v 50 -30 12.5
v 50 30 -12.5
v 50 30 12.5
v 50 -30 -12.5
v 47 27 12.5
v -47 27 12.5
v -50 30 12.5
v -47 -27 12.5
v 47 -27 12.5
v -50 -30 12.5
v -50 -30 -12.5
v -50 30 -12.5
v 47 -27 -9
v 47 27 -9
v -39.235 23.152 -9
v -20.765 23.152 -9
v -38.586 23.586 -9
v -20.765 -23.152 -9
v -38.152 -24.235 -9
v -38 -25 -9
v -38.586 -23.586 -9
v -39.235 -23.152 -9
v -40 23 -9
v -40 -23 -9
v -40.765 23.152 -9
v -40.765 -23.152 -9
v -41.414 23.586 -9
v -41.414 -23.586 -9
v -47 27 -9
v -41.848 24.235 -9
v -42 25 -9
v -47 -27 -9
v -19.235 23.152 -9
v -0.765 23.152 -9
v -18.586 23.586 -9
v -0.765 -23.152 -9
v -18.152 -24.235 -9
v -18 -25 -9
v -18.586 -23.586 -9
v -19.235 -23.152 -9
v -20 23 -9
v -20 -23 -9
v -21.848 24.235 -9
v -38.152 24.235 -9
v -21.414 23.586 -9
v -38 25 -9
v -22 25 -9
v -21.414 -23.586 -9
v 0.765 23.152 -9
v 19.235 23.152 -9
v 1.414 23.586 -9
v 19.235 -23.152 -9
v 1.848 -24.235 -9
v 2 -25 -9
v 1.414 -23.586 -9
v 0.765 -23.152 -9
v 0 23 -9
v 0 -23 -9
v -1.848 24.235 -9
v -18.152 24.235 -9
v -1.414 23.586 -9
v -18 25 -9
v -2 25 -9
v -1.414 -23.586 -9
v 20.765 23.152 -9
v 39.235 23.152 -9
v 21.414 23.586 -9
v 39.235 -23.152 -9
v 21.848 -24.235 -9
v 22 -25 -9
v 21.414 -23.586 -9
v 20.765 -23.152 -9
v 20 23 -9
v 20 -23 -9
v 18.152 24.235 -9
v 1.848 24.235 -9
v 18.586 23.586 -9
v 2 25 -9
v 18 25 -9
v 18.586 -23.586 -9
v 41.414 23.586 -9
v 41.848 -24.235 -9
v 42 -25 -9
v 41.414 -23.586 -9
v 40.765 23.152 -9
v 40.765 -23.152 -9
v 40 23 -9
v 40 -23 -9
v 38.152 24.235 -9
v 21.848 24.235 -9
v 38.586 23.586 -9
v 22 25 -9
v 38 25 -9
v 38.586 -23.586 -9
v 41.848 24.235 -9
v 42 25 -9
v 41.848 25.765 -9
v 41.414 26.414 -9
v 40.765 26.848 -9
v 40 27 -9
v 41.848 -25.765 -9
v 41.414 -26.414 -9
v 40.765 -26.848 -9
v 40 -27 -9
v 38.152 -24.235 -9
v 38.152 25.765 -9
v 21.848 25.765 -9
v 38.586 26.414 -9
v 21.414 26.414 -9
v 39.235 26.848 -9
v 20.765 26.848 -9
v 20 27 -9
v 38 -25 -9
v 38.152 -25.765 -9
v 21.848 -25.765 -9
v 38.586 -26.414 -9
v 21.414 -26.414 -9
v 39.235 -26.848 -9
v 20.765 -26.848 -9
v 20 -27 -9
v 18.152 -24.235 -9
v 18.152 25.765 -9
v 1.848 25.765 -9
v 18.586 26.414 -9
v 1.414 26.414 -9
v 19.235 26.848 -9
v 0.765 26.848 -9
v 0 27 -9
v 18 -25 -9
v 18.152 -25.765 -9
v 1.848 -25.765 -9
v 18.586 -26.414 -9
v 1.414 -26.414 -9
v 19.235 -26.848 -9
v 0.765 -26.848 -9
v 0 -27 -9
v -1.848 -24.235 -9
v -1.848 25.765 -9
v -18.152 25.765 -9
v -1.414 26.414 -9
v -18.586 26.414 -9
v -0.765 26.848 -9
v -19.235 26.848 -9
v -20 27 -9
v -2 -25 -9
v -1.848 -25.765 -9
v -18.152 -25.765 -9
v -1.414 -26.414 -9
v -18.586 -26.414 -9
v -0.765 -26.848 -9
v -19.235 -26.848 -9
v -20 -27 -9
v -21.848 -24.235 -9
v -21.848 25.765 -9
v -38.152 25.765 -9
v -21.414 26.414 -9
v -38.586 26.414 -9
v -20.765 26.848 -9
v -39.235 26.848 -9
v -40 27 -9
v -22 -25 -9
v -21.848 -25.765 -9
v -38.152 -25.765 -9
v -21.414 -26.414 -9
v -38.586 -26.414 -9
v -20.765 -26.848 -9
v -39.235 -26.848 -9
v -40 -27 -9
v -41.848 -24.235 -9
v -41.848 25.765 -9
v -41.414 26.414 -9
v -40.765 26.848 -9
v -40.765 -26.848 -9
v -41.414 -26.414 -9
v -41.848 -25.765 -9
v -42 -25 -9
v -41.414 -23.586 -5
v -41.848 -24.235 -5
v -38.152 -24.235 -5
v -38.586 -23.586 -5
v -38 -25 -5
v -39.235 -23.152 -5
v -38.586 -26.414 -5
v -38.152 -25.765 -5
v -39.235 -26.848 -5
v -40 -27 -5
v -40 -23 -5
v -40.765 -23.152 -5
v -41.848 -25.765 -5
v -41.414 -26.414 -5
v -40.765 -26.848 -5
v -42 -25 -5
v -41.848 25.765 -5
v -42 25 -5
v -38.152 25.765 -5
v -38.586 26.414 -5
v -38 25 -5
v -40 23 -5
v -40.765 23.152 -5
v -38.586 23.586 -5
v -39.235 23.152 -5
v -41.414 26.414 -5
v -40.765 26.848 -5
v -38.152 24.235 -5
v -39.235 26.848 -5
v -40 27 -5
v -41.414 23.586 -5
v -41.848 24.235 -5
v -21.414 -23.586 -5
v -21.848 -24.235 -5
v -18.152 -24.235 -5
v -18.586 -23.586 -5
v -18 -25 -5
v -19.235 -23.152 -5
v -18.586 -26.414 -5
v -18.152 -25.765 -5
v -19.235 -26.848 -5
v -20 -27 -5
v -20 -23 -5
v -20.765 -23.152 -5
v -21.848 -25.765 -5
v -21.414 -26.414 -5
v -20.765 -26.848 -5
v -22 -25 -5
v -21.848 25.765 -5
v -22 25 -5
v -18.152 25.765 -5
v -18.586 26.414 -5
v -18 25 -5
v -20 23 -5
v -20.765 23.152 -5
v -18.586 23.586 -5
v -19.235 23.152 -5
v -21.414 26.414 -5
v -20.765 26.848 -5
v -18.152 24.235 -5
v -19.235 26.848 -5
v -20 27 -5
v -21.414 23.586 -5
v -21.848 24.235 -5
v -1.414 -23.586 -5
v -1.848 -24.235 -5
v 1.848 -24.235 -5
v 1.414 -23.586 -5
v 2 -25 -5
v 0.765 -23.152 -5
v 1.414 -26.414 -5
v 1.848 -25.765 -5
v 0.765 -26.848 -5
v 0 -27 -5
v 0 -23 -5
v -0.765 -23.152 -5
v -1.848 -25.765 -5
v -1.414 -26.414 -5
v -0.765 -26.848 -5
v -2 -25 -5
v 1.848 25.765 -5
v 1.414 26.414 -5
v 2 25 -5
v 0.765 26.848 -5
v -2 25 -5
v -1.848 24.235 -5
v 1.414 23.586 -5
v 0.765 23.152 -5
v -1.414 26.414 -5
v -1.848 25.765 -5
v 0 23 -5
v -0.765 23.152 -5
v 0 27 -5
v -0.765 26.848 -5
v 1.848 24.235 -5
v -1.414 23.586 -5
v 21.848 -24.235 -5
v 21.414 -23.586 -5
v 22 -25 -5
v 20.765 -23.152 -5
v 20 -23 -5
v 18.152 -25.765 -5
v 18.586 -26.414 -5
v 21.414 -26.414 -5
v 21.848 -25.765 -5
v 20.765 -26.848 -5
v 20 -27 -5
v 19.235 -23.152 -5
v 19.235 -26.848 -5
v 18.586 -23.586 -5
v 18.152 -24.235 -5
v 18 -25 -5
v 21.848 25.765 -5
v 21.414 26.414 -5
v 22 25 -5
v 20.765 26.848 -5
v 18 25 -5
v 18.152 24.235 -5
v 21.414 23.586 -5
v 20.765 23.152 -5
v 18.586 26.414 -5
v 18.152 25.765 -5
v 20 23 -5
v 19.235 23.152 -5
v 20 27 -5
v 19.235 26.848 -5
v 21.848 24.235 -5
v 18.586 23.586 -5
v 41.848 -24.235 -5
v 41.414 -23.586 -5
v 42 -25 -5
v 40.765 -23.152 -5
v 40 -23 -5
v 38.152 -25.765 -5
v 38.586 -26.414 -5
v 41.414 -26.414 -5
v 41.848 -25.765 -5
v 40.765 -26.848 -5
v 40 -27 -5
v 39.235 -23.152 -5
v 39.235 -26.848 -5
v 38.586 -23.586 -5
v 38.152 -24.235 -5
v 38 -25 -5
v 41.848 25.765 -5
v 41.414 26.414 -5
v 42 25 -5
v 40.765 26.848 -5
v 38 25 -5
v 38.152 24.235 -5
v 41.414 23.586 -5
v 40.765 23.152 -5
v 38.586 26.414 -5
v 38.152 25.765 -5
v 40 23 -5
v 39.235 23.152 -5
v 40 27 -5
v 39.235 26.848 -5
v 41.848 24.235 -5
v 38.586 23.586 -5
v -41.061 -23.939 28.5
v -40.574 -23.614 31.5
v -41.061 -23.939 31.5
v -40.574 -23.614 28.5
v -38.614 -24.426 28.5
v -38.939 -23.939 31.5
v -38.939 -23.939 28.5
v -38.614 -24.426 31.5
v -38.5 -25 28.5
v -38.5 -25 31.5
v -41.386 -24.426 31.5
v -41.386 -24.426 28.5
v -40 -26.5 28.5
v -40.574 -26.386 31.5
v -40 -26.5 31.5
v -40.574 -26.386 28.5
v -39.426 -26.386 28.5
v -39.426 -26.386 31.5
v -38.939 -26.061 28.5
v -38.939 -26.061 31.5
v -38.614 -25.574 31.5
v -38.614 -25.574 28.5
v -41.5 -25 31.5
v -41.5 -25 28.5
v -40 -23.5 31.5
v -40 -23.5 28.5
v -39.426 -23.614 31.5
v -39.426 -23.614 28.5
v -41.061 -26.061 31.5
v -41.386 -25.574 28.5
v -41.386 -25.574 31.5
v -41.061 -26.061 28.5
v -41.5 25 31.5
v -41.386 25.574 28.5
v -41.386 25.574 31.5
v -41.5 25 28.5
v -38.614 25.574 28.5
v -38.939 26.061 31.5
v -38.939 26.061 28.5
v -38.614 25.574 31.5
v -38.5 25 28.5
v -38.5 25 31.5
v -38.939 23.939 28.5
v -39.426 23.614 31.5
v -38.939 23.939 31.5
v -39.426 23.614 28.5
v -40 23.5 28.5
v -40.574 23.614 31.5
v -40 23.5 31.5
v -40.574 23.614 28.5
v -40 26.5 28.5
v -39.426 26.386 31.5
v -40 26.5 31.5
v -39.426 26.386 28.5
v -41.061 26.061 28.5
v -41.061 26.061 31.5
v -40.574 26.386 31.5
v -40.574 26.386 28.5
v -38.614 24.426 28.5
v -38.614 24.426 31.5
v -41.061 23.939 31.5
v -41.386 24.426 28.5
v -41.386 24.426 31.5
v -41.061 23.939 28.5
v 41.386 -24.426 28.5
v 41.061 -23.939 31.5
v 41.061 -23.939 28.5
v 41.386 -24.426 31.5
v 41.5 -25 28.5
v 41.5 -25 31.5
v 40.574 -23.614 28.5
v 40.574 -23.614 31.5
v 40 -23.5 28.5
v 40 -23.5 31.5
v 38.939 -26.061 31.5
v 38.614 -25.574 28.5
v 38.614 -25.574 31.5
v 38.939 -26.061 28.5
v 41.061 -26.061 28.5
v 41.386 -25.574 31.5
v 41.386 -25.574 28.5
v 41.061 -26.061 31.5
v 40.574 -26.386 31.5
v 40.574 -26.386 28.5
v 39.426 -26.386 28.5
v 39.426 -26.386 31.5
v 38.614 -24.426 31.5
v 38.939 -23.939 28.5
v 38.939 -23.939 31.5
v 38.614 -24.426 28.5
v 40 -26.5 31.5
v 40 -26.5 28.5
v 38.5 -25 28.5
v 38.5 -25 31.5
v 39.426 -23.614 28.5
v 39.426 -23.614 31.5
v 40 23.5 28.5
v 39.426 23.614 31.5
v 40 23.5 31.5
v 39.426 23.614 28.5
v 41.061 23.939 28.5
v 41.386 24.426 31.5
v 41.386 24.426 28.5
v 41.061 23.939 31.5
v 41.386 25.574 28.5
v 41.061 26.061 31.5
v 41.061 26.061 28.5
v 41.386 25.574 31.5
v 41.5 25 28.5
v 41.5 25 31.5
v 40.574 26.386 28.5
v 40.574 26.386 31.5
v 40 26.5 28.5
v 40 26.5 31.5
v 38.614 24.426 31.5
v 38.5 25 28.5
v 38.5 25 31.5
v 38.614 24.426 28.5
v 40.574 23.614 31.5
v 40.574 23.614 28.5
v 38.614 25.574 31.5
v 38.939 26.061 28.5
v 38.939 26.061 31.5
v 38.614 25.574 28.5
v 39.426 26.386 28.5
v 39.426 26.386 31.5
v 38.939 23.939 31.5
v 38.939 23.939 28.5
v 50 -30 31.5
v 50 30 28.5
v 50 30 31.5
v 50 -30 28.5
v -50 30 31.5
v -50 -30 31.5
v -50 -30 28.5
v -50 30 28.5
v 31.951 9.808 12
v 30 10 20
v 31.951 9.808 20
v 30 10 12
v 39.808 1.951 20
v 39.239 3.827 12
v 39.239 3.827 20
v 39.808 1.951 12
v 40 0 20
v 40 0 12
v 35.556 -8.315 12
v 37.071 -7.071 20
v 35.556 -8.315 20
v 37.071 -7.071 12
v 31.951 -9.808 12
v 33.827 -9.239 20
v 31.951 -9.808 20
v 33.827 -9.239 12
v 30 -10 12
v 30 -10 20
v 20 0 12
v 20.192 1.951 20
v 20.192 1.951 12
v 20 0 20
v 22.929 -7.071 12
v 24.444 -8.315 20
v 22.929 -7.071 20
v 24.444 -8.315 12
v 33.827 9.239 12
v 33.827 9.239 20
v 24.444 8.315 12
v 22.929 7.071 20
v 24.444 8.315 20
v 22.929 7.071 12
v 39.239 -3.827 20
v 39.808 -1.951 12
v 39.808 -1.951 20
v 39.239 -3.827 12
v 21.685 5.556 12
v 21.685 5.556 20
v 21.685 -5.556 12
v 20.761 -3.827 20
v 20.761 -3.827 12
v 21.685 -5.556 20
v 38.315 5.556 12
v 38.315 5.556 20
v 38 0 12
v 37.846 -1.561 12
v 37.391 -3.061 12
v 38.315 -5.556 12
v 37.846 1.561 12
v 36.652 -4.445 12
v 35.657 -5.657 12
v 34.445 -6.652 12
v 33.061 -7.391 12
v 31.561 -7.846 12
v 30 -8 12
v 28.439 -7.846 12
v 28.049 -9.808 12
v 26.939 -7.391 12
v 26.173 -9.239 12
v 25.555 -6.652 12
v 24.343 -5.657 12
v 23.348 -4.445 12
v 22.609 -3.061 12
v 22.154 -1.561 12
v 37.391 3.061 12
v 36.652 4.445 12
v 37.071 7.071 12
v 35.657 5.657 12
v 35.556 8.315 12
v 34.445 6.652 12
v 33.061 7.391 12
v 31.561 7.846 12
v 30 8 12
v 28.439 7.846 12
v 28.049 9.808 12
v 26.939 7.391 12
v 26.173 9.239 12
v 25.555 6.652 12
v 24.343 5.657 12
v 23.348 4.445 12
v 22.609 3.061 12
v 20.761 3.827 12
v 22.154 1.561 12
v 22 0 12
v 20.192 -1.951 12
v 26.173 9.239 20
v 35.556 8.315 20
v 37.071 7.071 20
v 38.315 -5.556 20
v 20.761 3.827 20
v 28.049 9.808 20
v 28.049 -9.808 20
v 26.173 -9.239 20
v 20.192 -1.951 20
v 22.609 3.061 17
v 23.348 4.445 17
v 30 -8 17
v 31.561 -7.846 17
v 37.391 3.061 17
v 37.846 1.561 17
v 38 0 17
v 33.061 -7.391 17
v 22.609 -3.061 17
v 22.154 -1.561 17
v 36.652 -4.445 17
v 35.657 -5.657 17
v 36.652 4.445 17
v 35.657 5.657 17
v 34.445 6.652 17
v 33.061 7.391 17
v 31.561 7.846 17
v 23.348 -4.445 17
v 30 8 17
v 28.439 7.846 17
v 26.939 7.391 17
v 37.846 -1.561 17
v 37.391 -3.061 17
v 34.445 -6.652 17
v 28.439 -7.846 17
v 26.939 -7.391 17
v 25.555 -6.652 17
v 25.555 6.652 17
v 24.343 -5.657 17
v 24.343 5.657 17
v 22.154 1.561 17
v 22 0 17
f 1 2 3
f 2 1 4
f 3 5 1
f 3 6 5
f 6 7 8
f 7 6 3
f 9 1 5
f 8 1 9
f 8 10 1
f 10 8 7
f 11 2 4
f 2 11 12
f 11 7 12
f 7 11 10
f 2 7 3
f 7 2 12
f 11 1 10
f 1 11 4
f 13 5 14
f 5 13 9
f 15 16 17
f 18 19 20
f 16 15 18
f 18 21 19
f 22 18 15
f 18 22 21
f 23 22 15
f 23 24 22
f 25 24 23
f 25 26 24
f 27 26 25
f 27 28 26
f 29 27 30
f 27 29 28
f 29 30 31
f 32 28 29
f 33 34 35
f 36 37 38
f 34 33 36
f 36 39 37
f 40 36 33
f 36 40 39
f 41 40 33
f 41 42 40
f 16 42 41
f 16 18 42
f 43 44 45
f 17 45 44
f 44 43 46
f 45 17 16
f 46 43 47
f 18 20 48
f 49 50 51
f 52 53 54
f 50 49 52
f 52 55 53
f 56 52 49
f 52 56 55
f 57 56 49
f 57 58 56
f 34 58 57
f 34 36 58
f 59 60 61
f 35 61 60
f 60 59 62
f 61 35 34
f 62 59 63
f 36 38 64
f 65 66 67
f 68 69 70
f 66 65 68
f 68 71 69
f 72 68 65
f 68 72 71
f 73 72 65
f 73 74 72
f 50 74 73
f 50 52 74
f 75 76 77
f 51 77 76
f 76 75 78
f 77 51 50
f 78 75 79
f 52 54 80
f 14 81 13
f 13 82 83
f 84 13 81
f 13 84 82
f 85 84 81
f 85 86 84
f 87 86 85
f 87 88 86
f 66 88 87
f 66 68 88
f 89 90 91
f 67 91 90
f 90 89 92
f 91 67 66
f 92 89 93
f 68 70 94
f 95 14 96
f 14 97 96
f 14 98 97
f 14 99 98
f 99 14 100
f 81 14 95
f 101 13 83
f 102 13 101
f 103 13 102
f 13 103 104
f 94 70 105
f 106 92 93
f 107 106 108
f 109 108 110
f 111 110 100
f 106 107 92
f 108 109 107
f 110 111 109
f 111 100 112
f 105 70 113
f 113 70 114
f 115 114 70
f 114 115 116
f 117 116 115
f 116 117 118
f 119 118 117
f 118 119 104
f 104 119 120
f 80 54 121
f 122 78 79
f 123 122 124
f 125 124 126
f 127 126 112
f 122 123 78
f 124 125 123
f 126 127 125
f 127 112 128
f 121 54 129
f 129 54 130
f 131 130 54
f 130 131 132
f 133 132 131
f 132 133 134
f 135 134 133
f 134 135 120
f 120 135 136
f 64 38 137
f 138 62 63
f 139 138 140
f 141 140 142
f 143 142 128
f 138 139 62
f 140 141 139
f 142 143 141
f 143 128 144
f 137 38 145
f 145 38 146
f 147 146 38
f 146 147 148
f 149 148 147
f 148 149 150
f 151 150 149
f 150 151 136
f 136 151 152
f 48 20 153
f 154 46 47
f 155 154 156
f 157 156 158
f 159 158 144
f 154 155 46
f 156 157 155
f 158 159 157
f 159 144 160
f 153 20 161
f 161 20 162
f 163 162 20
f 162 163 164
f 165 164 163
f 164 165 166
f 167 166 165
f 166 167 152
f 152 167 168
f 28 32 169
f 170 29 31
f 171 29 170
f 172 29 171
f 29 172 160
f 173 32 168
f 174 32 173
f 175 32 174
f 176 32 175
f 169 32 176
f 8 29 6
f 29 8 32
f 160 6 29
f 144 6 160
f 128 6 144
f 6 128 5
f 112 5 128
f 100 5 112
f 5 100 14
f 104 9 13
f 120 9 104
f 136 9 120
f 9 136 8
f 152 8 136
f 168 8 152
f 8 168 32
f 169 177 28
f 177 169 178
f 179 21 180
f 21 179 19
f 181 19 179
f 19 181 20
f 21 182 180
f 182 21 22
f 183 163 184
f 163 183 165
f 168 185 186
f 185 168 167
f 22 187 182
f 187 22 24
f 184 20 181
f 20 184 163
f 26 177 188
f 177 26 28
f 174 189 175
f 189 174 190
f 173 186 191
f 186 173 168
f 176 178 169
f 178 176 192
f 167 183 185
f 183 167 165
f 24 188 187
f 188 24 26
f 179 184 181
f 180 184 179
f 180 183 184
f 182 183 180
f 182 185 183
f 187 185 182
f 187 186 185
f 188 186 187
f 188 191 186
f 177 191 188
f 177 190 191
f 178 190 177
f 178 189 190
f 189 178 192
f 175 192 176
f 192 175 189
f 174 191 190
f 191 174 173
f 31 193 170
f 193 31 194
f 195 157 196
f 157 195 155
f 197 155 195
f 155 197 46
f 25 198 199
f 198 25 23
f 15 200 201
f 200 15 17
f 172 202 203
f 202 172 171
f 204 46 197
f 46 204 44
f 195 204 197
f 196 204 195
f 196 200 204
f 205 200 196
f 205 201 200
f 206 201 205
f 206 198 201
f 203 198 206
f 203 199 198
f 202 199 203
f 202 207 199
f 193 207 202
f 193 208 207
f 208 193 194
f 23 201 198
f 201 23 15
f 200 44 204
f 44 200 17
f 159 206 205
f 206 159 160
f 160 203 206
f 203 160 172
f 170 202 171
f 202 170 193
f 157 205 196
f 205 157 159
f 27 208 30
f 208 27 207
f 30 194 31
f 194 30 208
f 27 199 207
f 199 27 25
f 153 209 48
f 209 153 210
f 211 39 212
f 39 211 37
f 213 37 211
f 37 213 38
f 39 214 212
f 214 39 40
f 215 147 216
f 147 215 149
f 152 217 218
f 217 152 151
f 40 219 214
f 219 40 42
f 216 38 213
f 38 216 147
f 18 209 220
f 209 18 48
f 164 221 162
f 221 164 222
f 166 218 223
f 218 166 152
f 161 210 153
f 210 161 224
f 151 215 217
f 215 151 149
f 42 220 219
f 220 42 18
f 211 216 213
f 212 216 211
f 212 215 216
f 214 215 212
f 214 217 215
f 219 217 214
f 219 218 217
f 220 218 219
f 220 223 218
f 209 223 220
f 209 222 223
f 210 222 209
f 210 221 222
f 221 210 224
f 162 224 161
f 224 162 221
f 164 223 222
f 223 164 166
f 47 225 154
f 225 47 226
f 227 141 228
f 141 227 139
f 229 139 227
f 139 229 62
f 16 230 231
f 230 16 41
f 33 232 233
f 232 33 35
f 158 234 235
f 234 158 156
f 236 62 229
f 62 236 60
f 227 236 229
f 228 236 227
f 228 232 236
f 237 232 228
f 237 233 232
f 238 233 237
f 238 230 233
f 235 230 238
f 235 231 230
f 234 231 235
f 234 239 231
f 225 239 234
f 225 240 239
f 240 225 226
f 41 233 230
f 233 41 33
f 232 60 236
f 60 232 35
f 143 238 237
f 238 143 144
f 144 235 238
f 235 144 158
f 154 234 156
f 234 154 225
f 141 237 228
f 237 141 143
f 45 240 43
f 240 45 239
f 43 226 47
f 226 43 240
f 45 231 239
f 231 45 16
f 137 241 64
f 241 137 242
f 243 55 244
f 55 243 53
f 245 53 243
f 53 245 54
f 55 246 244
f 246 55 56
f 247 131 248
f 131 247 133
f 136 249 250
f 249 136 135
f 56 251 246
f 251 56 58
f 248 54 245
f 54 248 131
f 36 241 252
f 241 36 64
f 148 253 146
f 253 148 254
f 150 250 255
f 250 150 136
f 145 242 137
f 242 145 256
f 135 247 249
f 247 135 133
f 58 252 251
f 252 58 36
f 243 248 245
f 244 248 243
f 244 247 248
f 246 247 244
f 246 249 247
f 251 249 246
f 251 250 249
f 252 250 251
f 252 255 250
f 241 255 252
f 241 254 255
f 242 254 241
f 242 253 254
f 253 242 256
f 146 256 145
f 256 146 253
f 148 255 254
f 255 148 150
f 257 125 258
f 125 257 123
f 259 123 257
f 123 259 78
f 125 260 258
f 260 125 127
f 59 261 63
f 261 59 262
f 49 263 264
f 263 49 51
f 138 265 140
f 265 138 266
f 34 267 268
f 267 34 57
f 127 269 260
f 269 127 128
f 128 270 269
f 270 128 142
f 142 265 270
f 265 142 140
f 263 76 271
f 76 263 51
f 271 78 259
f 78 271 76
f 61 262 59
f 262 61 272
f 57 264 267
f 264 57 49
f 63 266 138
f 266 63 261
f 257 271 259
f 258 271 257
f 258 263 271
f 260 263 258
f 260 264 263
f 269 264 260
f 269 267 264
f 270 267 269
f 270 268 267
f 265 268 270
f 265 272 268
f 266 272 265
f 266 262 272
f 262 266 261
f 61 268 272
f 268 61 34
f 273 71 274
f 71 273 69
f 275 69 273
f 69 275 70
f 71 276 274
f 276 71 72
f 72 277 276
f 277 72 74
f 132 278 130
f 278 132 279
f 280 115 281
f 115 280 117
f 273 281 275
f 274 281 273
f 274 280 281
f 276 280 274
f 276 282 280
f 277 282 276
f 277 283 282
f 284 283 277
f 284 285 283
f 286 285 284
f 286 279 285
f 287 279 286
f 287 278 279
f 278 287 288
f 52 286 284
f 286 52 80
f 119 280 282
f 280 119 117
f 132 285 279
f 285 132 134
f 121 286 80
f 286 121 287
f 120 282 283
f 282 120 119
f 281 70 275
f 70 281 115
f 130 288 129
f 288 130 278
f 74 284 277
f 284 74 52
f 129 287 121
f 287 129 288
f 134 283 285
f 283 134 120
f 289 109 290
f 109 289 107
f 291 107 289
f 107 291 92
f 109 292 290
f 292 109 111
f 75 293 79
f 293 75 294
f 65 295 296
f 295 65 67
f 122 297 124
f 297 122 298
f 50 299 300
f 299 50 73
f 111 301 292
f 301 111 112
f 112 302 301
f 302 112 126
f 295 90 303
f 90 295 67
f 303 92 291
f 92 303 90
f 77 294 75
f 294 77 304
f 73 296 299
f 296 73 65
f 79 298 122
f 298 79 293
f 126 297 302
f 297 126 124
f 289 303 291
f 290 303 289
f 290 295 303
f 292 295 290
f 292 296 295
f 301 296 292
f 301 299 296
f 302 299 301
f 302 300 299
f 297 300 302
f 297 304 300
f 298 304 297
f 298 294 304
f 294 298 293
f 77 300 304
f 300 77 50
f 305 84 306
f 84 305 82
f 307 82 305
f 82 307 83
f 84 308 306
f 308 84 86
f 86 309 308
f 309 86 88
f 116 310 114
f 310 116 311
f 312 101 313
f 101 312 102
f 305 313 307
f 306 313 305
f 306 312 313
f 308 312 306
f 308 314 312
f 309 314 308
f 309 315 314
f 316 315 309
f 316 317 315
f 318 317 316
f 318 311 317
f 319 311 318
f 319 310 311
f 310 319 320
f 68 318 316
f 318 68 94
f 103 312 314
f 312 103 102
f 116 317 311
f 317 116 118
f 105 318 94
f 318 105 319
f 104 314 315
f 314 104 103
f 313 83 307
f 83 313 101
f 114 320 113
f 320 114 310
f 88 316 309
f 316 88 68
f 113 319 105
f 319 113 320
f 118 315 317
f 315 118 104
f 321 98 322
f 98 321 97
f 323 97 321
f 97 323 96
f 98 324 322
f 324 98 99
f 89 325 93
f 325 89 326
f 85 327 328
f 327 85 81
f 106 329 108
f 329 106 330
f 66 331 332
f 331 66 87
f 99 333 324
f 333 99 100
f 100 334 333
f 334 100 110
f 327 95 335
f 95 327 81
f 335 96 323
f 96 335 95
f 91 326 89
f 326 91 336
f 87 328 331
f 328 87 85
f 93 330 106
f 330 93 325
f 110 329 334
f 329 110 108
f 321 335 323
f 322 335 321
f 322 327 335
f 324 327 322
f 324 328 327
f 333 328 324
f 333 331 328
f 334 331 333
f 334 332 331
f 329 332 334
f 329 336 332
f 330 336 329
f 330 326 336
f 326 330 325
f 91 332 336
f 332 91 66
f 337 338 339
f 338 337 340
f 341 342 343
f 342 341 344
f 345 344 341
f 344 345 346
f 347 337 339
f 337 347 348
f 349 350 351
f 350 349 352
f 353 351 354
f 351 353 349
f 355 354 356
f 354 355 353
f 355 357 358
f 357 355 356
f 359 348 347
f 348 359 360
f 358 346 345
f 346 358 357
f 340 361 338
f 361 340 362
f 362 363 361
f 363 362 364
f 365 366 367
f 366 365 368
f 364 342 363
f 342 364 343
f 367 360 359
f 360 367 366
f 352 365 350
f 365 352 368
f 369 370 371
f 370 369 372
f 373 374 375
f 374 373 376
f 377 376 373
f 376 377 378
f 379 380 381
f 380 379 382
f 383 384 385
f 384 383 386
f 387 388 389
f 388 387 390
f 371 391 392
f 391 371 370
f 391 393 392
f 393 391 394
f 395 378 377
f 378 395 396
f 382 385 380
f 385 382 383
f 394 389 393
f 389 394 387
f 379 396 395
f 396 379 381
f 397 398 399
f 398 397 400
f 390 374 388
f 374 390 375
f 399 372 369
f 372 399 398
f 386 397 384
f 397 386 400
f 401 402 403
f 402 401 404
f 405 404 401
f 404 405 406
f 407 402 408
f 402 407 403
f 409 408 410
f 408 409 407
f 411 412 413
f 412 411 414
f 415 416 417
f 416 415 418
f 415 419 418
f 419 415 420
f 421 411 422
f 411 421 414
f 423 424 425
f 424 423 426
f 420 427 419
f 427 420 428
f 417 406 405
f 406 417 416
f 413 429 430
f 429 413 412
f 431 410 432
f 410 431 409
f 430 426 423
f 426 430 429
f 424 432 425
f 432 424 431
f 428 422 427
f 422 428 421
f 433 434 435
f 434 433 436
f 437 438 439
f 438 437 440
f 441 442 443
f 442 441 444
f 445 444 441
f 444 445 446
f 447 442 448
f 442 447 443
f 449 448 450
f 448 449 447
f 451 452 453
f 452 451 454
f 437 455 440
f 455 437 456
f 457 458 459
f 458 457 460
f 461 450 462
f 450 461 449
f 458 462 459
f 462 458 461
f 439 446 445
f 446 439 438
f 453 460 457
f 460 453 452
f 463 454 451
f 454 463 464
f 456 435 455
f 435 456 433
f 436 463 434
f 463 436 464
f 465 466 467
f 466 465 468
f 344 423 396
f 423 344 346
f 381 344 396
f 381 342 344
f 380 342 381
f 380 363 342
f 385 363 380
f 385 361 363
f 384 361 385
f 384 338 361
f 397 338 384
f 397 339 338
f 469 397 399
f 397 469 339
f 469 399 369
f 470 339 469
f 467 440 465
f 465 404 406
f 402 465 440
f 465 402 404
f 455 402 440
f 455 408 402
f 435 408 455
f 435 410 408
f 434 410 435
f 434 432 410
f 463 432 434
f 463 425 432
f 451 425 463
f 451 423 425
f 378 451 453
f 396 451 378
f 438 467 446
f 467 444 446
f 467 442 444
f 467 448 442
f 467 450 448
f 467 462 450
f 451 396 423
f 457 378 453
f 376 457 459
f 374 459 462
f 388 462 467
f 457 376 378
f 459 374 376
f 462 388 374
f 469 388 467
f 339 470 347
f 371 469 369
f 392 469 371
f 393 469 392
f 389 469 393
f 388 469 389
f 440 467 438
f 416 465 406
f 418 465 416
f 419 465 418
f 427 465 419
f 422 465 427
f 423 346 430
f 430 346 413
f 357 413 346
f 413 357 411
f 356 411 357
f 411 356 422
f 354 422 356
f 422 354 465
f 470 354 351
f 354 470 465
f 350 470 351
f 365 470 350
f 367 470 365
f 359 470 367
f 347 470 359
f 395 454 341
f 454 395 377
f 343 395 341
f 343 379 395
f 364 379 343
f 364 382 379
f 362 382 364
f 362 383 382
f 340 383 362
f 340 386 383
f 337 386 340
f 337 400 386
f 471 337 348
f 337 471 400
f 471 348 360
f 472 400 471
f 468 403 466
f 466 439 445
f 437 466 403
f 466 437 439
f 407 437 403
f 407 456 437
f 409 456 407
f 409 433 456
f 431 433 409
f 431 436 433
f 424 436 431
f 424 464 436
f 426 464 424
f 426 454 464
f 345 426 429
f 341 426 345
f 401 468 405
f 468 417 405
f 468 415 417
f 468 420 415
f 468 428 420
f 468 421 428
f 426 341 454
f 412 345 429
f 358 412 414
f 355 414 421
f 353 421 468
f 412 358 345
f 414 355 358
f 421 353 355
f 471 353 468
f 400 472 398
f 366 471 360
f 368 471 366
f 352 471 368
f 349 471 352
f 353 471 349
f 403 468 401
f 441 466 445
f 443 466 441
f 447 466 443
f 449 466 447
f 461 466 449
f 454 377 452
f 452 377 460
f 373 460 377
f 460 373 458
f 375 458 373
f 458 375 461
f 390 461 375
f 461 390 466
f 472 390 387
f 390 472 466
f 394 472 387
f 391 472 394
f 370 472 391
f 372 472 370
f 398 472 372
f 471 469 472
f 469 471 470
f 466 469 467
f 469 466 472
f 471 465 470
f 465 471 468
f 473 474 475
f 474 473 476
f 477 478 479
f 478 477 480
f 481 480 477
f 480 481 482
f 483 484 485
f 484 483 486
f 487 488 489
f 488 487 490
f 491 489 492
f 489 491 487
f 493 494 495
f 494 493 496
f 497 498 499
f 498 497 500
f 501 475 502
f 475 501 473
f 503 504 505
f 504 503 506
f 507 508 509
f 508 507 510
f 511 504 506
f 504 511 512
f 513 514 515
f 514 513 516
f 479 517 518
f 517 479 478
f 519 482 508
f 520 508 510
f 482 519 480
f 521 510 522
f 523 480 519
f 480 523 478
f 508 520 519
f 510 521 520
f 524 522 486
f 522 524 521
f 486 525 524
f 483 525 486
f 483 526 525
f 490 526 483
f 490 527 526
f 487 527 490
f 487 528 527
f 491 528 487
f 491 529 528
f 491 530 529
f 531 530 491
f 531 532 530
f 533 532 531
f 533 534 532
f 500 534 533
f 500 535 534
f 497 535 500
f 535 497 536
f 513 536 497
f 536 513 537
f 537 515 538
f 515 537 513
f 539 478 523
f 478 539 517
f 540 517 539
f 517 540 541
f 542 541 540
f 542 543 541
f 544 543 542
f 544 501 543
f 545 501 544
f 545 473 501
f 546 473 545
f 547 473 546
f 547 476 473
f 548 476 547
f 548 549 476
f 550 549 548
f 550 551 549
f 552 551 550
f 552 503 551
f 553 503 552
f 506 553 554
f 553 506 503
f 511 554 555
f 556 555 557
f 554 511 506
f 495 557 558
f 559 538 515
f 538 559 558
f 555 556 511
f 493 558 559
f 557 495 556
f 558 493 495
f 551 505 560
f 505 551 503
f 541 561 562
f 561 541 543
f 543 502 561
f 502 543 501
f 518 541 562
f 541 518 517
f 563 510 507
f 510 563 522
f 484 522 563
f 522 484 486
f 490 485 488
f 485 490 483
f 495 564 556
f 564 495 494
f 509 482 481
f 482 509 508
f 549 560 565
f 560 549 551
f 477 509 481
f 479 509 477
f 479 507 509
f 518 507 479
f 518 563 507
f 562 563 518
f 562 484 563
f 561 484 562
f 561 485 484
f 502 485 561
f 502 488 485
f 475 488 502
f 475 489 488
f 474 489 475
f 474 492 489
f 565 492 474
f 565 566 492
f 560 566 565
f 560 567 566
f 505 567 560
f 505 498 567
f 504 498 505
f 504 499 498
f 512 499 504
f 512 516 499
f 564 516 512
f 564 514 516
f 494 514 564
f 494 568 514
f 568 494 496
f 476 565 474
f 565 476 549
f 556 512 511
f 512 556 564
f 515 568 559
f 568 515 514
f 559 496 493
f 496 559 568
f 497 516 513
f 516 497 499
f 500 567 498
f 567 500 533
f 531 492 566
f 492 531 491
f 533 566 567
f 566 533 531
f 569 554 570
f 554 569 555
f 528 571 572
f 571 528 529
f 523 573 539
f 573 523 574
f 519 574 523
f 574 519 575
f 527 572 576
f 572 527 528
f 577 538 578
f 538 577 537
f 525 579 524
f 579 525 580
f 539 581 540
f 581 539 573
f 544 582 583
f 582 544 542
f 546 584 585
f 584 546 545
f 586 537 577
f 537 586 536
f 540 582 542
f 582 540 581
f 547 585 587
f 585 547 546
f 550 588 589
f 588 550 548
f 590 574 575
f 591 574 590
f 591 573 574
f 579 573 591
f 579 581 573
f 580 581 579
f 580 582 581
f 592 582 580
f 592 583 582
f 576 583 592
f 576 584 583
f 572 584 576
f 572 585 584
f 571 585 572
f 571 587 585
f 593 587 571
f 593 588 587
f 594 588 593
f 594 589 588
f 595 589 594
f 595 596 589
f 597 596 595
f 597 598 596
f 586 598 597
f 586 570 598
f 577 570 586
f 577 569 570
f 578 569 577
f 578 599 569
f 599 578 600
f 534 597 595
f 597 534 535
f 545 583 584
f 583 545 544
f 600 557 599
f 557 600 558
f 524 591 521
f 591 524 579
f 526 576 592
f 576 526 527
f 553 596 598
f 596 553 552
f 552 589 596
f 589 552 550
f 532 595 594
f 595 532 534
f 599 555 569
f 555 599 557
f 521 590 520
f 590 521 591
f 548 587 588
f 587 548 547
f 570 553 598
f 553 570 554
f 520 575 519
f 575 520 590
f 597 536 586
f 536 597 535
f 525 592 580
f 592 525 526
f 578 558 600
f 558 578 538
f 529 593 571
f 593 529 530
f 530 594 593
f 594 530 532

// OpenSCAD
// TeploVid-4 Lot 4.4
module body() { difference() { cube([100,60,25],center=true); translate([0,0,2]) cube([94,54,22],center=true); } }
module mounts() { for(x=[-40,-20,0,20,40]) { translate([x,-25,-10]) cylinder(h=5,r=2,$fn=16); translate([x,25,-10]) cylinder(h=5,r=2,$fn=16); } }
module lid() { translate([0,0,30]) difference() { cube([100,60,3],center=true); for(x=[-40,40]) for(y=[-25,25]) translate([x,y,0]) cylinder(h=5,r=1.5,center=true,$fn=16); } }
module sensor() { translate([30,0,12]) difference() { cylinder(h=8,r=10,$fn=32); cylinder(h=10,r=8,center=true,$fn=32); } }
color("SteelBlue") body();
color("Gold") mounts();
color("LightBlue",0.7) lid();
color("DarkSlateGray") sensor();
